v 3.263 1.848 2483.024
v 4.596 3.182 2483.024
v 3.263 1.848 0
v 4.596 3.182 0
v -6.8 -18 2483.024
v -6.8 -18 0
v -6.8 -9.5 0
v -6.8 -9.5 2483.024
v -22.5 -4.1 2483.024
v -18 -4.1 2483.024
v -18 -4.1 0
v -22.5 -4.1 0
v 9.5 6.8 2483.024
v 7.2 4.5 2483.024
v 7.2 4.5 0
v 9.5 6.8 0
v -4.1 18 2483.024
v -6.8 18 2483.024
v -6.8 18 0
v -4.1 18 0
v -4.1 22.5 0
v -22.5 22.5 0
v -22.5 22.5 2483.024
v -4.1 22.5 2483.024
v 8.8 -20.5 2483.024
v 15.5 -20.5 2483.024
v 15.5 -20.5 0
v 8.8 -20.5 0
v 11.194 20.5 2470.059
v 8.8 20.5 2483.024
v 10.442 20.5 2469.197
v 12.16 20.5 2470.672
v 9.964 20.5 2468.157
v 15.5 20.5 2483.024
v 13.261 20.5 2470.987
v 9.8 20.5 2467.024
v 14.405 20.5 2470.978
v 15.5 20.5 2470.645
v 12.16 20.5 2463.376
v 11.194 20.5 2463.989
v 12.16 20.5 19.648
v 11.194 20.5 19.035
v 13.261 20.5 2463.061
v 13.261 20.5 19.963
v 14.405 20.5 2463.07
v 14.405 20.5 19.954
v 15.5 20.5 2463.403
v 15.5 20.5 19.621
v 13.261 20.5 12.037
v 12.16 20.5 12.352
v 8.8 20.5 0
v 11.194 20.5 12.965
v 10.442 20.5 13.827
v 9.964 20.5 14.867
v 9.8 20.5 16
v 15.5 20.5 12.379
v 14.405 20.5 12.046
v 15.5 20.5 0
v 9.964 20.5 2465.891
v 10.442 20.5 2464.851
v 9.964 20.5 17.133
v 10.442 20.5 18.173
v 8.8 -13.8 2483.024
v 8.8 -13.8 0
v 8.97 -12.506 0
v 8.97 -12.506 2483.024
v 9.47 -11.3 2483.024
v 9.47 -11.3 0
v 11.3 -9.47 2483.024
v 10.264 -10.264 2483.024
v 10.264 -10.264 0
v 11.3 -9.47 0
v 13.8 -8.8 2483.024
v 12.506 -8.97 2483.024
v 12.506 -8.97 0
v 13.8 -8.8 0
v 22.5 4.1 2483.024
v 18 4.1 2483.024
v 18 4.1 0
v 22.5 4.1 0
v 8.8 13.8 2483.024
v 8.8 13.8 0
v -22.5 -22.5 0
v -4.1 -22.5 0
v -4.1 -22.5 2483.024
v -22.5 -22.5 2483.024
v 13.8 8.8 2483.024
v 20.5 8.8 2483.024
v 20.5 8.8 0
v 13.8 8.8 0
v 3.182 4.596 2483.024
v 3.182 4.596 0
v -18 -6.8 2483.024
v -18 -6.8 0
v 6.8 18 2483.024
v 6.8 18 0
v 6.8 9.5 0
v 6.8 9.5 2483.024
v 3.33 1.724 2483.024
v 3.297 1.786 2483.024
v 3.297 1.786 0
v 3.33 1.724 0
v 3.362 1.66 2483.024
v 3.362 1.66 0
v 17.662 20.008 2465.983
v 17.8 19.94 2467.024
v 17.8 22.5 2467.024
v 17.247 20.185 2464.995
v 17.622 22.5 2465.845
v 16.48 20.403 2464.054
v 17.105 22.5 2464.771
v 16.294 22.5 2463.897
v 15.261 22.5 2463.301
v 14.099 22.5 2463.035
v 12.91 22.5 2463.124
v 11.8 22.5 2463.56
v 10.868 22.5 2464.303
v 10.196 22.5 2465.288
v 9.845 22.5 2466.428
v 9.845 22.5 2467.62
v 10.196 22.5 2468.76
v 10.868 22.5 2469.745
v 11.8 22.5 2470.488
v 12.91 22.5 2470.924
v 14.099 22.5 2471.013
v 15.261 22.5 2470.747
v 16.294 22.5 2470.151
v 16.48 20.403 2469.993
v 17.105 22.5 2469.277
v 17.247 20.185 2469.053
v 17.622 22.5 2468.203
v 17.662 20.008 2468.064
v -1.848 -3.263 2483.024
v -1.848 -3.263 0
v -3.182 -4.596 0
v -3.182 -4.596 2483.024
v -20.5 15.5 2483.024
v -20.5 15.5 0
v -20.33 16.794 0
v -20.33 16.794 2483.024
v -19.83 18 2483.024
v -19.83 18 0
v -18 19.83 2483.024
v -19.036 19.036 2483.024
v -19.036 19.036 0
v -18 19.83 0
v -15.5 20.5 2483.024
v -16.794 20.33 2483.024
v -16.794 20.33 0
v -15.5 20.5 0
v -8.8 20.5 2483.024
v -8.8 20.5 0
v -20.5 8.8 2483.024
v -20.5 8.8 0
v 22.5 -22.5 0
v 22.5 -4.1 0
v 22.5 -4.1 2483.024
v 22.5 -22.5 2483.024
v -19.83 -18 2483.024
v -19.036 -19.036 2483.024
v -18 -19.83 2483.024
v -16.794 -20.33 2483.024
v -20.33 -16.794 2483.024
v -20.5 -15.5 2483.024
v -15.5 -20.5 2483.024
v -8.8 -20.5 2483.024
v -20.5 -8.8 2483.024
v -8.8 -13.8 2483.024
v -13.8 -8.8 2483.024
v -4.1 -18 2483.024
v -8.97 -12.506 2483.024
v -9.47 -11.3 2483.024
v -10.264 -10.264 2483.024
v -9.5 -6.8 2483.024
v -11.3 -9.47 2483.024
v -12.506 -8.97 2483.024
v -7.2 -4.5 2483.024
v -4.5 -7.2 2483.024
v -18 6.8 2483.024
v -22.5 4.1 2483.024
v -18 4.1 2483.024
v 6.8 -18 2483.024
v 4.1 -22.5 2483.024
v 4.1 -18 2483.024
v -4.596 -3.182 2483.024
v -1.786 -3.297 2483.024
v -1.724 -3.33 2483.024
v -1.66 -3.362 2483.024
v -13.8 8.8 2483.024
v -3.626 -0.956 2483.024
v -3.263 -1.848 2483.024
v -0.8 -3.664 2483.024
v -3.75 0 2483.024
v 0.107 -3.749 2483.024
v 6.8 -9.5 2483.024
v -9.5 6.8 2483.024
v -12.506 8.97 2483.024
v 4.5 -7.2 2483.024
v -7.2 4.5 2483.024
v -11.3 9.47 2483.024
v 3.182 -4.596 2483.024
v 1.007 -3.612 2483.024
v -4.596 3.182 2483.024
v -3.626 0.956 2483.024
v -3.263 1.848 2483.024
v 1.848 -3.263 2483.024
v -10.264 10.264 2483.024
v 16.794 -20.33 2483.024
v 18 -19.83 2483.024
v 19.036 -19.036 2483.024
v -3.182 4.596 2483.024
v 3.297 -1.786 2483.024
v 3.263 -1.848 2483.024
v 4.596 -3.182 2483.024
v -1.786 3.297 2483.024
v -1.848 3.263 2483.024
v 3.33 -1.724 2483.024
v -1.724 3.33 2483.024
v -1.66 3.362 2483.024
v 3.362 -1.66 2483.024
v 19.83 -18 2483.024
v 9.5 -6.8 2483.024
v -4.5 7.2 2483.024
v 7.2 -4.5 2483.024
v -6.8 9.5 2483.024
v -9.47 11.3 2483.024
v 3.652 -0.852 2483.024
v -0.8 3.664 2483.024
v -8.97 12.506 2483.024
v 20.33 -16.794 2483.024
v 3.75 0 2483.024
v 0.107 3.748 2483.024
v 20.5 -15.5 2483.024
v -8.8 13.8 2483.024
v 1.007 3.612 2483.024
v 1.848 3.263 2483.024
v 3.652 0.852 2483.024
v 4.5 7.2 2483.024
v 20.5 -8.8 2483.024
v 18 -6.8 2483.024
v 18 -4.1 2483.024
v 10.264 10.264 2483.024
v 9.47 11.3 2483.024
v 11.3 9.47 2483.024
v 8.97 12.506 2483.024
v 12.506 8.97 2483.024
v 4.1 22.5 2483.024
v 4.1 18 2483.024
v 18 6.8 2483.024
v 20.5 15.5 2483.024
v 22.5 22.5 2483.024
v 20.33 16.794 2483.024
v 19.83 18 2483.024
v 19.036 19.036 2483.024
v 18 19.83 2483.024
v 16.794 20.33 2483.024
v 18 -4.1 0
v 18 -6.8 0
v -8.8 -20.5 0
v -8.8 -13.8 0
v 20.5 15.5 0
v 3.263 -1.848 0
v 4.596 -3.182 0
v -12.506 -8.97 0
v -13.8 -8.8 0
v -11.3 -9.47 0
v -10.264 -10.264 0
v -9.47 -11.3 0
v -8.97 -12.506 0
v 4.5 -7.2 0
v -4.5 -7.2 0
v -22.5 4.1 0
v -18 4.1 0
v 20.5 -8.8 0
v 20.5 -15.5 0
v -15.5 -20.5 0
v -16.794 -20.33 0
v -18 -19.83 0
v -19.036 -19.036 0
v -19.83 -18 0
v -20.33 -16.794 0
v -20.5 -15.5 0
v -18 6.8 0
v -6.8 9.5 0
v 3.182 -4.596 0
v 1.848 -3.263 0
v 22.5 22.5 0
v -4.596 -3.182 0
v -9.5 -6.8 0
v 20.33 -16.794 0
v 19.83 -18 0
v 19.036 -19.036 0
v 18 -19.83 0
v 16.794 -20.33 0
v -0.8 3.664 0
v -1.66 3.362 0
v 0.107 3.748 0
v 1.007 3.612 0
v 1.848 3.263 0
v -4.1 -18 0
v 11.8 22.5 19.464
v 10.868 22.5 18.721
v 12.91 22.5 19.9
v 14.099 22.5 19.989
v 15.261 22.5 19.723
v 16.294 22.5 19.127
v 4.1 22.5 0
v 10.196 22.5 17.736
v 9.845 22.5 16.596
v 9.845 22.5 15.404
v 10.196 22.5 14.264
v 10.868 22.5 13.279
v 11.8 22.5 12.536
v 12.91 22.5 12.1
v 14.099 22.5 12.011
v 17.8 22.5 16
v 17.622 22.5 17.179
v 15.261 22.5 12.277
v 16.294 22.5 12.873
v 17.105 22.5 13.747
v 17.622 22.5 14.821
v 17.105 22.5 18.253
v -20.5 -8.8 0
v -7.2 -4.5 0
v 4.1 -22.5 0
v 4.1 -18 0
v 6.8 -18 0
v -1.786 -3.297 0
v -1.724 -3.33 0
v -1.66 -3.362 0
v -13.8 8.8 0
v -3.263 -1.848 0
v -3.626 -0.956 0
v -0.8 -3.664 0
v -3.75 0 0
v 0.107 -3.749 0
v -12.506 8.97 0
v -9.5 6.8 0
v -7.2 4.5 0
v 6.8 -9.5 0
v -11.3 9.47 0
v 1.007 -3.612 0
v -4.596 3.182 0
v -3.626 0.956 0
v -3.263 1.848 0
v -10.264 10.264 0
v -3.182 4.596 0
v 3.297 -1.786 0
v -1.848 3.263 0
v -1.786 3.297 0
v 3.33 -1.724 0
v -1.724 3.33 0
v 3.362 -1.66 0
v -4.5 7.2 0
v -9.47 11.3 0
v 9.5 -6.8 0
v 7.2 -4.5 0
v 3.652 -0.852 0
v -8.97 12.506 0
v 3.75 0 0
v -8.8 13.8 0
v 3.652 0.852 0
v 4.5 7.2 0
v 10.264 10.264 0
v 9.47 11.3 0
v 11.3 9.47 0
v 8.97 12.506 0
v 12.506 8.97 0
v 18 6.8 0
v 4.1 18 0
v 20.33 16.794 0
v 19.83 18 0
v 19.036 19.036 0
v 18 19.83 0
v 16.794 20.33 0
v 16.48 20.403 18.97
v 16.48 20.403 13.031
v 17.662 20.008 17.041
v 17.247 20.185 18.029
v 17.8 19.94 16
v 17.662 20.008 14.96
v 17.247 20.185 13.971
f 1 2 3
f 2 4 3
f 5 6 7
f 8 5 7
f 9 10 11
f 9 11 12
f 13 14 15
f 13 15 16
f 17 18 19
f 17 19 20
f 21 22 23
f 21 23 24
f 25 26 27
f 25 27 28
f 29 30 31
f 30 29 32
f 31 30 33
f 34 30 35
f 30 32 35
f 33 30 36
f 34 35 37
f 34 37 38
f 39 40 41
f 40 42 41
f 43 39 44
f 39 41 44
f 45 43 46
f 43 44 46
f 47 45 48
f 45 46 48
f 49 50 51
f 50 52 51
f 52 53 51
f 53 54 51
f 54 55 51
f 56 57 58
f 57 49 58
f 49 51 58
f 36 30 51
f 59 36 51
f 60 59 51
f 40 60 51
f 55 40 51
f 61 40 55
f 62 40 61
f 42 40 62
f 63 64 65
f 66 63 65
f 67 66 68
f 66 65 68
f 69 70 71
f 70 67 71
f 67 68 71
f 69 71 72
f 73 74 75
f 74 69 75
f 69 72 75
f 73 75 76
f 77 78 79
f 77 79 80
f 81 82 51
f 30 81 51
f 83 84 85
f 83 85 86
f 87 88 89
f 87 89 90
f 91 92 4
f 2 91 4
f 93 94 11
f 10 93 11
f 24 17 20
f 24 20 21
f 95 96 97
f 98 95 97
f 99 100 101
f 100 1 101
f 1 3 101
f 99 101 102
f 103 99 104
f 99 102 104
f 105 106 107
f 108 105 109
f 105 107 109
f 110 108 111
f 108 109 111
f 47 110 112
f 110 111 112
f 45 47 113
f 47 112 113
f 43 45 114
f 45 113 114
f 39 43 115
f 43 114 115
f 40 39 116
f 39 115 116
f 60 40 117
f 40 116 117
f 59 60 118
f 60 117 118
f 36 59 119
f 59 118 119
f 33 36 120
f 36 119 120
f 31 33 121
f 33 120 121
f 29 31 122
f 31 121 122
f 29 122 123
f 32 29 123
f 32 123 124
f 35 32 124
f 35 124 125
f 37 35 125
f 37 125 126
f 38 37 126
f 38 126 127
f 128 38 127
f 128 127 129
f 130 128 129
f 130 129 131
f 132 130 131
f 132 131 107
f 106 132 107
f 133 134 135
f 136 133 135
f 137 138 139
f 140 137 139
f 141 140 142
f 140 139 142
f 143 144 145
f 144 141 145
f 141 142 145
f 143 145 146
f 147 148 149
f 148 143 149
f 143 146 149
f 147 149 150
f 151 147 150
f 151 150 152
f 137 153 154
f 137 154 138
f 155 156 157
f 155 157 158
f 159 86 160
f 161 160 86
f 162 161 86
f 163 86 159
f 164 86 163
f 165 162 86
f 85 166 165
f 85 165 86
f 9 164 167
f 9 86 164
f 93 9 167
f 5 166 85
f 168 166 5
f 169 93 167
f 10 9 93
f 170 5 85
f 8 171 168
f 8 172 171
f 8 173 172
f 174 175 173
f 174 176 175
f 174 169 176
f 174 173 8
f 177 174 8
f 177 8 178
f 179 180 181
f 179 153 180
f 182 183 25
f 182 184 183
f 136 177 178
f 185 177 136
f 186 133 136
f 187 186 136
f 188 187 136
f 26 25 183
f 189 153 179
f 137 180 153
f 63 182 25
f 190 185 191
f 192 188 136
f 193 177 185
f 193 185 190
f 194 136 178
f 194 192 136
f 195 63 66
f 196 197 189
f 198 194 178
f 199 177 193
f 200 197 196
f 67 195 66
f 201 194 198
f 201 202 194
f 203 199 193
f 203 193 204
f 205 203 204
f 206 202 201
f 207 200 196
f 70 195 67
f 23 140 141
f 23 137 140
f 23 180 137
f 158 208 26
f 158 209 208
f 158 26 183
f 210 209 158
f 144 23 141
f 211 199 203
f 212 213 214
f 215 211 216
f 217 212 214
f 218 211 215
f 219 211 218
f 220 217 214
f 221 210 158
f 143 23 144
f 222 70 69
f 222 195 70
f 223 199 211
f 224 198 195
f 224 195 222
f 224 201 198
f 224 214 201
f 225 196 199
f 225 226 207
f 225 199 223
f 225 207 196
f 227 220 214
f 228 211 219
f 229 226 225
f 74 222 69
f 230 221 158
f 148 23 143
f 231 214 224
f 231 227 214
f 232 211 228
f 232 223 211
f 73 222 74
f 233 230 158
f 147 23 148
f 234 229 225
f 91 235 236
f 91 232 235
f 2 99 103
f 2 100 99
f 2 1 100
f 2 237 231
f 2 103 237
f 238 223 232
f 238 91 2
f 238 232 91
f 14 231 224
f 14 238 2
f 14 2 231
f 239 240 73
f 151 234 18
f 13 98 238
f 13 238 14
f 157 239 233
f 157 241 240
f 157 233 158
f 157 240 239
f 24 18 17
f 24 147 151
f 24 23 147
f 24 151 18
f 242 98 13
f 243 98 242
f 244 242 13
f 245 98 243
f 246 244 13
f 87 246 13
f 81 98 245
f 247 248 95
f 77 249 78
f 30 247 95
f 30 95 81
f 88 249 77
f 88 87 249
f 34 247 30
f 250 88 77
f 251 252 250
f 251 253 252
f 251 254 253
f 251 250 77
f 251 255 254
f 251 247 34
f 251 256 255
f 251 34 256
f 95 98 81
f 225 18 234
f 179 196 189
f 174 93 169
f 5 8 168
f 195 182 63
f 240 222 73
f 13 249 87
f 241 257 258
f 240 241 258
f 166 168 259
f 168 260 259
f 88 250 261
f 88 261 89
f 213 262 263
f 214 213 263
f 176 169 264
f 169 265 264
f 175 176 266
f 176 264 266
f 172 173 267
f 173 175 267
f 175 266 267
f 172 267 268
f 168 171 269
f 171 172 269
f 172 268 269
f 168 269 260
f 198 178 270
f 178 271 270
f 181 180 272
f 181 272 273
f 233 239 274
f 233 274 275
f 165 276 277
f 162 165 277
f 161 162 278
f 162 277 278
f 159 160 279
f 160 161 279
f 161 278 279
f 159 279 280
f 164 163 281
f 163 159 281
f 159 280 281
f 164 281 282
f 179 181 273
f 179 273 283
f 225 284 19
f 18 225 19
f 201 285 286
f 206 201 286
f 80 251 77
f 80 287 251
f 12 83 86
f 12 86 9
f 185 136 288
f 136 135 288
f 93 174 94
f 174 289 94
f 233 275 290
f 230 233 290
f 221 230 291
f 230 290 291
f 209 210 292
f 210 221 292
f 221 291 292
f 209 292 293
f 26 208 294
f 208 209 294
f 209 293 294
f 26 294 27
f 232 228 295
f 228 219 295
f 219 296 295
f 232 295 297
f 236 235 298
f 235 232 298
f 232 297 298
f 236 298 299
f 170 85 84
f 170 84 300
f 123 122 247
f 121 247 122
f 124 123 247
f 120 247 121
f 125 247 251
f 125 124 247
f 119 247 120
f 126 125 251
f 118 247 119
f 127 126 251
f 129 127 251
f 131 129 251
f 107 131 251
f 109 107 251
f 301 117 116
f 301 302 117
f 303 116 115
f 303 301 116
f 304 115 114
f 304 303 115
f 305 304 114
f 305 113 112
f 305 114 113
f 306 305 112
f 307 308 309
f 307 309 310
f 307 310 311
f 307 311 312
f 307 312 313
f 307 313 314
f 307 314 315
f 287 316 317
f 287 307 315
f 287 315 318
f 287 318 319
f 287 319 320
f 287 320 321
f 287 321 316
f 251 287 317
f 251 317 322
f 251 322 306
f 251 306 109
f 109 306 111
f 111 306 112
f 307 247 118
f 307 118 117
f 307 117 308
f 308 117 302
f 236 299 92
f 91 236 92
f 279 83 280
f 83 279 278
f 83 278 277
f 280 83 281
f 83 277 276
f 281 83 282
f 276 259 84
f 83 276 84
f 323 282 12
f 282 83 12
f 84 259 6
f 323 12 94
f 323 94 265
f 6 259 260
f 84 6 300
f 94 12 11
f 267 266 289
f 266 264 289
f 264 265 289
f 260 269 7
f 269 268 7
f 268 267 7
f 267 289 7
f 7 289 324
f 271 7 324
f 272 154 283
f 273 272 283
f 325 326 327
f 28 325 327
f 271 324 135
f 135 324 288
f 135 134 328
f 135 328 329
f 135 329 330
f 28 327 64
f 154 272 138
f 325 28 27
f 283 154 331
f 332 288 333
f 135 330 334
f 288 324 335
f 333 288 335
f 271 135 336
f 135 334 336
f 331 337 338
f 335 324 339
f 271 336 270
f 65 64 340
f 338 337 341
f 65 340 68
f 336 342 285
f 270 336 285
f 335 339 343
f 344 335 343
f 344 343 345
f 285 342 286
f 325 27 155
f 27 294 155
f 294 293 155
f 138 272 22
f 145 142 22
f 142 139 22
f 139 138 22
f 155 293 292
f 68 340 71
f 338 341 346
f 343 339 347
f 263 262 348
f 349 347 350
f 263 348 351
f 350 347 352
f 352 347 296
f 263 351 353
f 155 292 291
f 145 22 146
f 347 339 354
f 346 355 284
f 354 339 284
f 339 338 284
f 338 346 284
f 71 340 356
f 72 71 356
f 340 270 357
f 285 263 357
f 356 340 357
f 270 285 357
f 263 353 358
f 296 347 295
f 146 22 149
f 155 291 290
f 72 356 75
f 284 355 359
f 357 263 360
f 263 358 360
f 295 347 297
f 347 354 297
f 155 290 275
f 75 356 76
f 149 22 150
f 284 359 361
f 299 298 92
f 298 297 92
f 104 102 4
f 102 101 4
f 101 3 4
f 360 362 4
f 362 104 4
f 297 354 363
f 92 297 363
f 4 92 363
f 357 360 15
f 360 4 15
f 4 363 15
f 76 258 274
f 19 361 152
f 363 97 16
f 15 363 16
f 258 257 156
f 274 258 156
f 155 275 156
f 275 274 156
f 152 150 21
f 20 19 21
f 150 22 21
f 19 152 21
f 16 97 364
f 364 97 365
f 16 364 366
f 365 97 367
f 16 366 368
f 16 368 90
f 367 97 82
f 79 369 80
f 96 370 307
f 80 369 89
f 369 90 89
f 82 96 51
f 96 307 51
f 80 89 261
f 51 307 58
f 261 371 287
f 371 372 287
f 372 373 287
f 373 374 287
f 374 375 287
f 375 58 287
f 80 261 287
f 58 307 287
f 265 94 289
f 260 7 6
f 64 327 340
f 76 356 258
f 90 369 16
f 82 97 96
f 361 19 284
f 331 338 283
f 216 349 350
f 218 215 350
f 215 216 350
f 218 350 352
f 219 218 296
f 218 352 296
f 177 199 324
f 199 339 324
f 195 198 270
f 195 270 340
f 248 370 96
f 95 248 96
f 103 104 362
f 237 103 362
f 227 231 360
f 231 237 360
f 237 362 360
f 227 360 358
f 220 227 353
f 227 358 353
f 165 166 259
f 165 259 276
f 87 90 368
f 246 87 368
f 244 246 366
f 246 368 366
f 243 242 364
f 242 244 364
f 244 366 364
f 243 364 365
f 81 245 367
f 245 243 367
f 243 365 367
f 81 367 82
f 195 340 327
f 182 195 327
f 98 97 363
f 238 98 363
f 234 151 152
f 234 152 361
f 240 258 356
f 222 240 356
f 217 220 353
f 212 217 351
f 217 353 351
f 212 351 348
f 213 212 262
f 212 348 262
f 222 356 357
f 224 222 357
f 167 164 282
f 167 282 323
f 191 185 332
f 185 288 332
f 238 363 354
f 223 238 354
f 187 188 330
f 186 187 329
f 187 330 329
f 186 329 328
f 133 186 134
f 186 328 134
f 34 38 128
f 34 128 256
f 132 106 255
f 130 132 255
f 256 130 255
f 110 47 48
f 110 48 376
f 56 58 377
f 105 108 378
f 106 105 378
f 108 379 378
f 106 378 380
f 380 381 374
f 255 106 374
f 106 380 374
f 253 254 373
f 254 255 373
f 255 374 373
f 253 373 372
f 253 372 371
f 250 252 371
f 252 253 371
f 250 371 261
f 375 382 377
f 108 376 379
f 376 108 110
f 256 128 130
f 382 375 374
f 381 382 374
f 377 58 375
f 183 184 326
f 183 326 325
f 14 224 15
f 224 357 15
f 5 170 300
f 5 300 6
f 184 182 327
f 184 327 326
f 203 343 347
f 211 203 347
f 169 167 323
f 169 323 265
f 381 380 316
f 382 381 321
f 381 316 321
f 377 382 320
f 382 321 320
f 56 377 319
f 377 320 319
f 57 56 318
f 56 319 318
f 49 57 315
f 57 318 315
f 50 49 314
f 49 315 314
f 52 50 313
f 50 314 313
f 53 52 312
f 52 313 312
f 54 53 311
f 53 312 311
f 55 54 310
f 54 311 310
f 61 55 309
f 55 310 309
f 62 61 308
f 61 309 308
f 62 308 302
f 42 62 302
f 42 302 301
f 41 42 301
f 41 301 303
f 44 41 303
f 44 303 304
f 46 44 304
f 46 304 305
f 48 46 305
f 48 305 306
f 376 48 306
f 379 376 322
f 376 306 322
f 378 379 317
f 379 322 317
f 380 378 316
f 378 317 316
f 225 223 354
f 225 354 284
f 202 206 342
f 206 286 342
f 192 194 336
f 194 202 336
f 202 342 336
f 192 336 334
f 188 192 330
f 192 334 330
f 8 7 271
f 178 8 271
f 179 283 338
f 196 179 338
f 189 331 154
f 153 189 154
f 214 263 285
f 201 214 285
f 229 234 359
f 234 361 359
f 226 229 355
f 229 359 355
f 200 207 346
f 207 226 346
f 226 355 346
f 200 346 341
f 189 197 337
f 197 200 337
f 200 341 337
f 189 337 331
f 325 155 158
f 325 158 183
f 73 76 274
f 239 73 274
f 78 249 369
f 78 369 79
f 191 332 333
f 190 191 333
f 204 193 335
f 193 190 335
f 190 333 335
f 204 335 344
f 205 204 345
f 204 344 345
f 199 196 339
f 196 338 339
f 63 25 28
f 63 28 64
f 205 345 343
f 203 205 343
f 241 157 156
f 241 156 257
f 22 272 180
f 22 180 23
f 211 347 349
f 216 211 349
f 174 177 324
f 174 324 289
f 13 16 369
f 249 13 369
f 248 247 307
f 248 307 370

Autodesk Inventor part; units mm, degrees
ref_plane "YZ Plane" through (0, 0, 0) normal (1, 0, 0) x (0, 1, 0)
ref_plane "XZ Plane" through (0, 0, 0) normal (0, 1, 0) x (-1, 0, 0)
ref_plane "XY Plane" through (0, 0, 0) normal (0, 0, 1) x (1, 0, 0)
sketch "Sketch1" plane through (0, 0, 0) normal (0, 0, 1) x (1, 0, 0)
  line L0 (-4.1, -22.5) -> (-4.1, -18)
  line L1 (-4.6, -18) -> (-6.8, -18)
  line L2 (-6.8, -18) -> (-6.8, -9.5)
  line L3 (-6.8, -9.5) -> (-4.5, -7.2)
  line L4 (-4.5, -7.2) -> (4.5, -7.2)
  line L5 (4.5, -7.2) -> (6.8, -9.5)
  line L6 (6.8, -9.5) -> (6.8, -18)
  line L7 (4.1, -18) -> (4.1, -22.5)
  line L8 (22.5, -4.1) -> (18, -4.1)
  line L9 (18, -4.6) -> (18, -6.8)
  line L10 (18, -6.8) -> (9.5, -6.8)
  line L11 (9.5, -6.8) -> (7.2, -4.5)
  line L12 (7.2, -4.5) -> (7.2, 4.5)
  line L13 (7.2, 4.5) -> (9.5, 6.8)
  line L14 (9.5, 6.8) -> (18, 6.8)
  line L15 (18, 4.1) -> (22.5, 4.1)
  line L16 (22.5, 22.5) -> (22.5, 4.4)
  line L17 (4.1, 22.5) -> (4.1, 18)
  line L18 (4.6, 18) -> (6.8, 18)
  line L19 (6.8, 18) -> (6.8, 9.5)
  line L20 (6.8, 9.5) -> (4.5, 7.2)
  line L21 (4.5, 7.2) -> (-4.5, 7.2)
  line L22 (-4.5, 7.2) -> (-6.8, 9.5)
  line L23 (-6.8, 9.5) -> (-6.8, 18)
  line L24 (-4.1, 18) -> (-4.1, 22.5)
  line L25 (-22.5, 22.5) -> (-4.4, 22.5)
  line L26 (-22.5, 4.1) -> (-18, 4.1)
  line L27 (-18, 6.8) -> (-9.5, 6.8)
  line L28 (-9.5, 6.8) -> (-7.2, 4.5)
  line L29 (-7.2, 4.5) -> (-7.2, -4.5)
  line L30 (-7.2, -4.5) -> (-9.5, -6.8)
  line L31 (-9.5, -6.8) -> (-18, -6.8)
  line L32 (-18, -6.8) -> (-18, -4.6)
  line L33 (-18, -4.1) -> (-22.5, -4.1)
  line L34 (-22.5, -22.5) -> (-22.5, -4.4)
  line L35 (-4.4, -22.5) -> (-22.5, -22.5)
  line L36 (-4.5962, -3.182) -> (-3.2627, -1.8485)
  line L37 (-3.2627, 1.8485) -> (-4.5962, 3.182)
  line L38 (-4.5962, 3.182) -> (-3.182, 4.5962)
  line L39 (-3.182, 4.5962) -> (-1.8485, 3.2627)
  line L40 (1.8485, 3.2627) -> (3.182, 4.5962)
  line L41 (3.182, 4.5962) -> (4.5962, 3.182)
  line L42 (4.5962, 3.182) -> (3.2627, 1.8485)
  arc A0 (3.3625, -1.6602) -> (3.3625, 1.6602) centre (0, 0) ccw
  line L43 (3.2627, -1.8485) -> (4.5962, -3.182)
  line L44 (4.5962, -3.182) -> (3.182, -4.5962)
  line L45 (3.182, -4.5962) -> (1.8485, -3.2627)
  line L46 (-1.8485, -3.2627) -> (-3.182, -4.5962)
  line L47 (-3.182, -4.5962) -> (-4.5962, -3.182)
  arc A1 (13.8, -8.8) -> (8.8, -13.8) centre (13.8, -13.8) ccw
  line L48 (13.8, -8.8) -> (20.5, -8.8)
  line L49 (20.5, -8.8) -> (20.5, -15.5)
  arc A2 (15.5, -20.5) -> (20.5, -15.5) centre (15.5, -15.5) ccw
  line L50 (15.5, -20.5) -> (8.8, -20.5)
  line L51 (8.8, -20.5) -> (8.8, -13.8)
  arc A3 (8.8, 13.8) -> (13.8, 8.8) centre (13.8, 13.8) ccw
  line L52 (8.8, 13.8) -> (8.8, 20.5)
  line L53 (8.8, 20.5) -> (15.5, 20.5)
  arc A4 (20.5, 15.5) -> (15.5, 20.5) centre (15.5, 15.5) ccw
  line L54 (20.5, 15.5) -> (20.5, 8.8)
  line L55 (20.5, 8.8) -> (13.8, 8.8)
  arc A5 (-13.8, 8.8) -> (-8.8, 13.8) centre (-13.8, 13.8) ccw
  line L56 (-13.8, 8.8) -> (-20.5, 8.8)
  line L57 (-20.5, 8.8) -> (-20.5, 15.5)
  arc A6 (-15.5, 20.5) -> (-20.5, 15.5) centre (-15.5, 15.5) ccw
  line L58 (-15.5, 20.5) -> (-8.8, 20.5)
  line L59 (-8.8, 20.5) -> (-8.8, 13.8)
  arc A7 (-8.8, -13.8) -> (-13.8, -8.8) centre (-13.8, -13.8) ccw
  line L60 (-8.8, -13.8) -> (-8.8, -20.5)
  line L61 (-8.8, -20.5) -> (-15.5, -20.5)
  arc A8 (-20.5, -15.5) -> (-15.5, -20.5) centre (-15.5, -15.5) ccw
  line L62 (-20.5, -15.5) -> (-20.5, -8.8)
  line L63 (-20.5, -8.8) -> (-13.8, -8.8)
  line L64 (-6.8, 18) -> (-4.1, 18)
  line L65 (4.1, 18) -> (4.6, 18)
  line L66 (-4.4, 22.5) -> (-4.1, 22.5)
  line L67 (4.1, 22.5) -> (22.5, 22.5)
  arc A9 (3.3625, 1.6602) -> (3.2627, 1.8485) centre (0, 0) ccw
  arc A10 (1.8485, 3.2627) -> (-1.6602, 3.3625) centre (0, 0) ccw
  arc A11 (-1.6602, 3.3625) -> (-1.8485, 3.2627) centre (0, 0) ccw
  arc A12 (-3.2627, 1.8485) -> (-3.2627, -1.8485) centre (0, 0) ccw
  arc A13 (-1.8485, -3.2627) -> (-1.6602, -3.3625) centre (0, 0) ccw
  arc A14 (-1.6602, -3.3625) -> (1.8485, -3.2627) centre (0, 0) ccw
  arc A15 (3.2627, -1.8485) -> (3.3625, -1.6602) centre (0, 0) ccw
  line L68 (18, 6.8) -> (18, 4.1)
  line L69 (18, -4.1) -> (18, -4.6)
  line L70 (22.5, 4.4) -> (22.5, 4.1)
  line L71 (22.5, -4.1) -> (22.5, -22.5)
  line L72 (6.8, -18) -> (4.1, -18)
  line L73 (-4.1, -18) -> (-4.6, -18)
  line L74 (22.5, -22.5) -> (4.1, -22.5)
  line L75 (-4.1, -22.5) -> (-4.4, -22.5)
  line L76 (-22.5, -4.4) -> (-22.5, -4.1)
  line L77 (-22.5, 4.1) -> (-22.5, 22.5)
  line L78 (-18, -4.6) -> (-18, -4.1)
  line L79 (-18, 4.1) -> (-18, 6.8)
extrude "Extrusion1" add sketch "Sketch1" along normal blind 2483.024
sketch "Sketch2" plane through (4.1, 22.5, 2483.024) normal (0, 1, 0) x (1, 0, 0)
  line L0 (18.4, 2483.024) -> (18.4, 0) projected
  line L1 (0, 2483.024) -> (18.4, 2483.024) projected
  line L2 (9.7, 2483.024) -> (9.7, 0) projected
  circle A0 centre (9.7, 2467.024) radius 4
  point P0 (-4.1, 2483.024)
  dimension "d2" = 8
  dimension "d3" = 16
  dimension "d4" = 18.4
extrude "Extrusion2" cut sketch "Sketch2" against normal up to next
ref_plane "Work Plane1" through (0, 0, 1241.512) normal (0, 0, -1) x (-1, 0, 0)
mirror "Mirror1" about plane through (0, 0, 1241.512) normal (0, 0, -1) of "Extrusion2"
equation "\"d3\" = 2 * d2"
properties part number "ElectronicCase" material "Aluminum-6061"
